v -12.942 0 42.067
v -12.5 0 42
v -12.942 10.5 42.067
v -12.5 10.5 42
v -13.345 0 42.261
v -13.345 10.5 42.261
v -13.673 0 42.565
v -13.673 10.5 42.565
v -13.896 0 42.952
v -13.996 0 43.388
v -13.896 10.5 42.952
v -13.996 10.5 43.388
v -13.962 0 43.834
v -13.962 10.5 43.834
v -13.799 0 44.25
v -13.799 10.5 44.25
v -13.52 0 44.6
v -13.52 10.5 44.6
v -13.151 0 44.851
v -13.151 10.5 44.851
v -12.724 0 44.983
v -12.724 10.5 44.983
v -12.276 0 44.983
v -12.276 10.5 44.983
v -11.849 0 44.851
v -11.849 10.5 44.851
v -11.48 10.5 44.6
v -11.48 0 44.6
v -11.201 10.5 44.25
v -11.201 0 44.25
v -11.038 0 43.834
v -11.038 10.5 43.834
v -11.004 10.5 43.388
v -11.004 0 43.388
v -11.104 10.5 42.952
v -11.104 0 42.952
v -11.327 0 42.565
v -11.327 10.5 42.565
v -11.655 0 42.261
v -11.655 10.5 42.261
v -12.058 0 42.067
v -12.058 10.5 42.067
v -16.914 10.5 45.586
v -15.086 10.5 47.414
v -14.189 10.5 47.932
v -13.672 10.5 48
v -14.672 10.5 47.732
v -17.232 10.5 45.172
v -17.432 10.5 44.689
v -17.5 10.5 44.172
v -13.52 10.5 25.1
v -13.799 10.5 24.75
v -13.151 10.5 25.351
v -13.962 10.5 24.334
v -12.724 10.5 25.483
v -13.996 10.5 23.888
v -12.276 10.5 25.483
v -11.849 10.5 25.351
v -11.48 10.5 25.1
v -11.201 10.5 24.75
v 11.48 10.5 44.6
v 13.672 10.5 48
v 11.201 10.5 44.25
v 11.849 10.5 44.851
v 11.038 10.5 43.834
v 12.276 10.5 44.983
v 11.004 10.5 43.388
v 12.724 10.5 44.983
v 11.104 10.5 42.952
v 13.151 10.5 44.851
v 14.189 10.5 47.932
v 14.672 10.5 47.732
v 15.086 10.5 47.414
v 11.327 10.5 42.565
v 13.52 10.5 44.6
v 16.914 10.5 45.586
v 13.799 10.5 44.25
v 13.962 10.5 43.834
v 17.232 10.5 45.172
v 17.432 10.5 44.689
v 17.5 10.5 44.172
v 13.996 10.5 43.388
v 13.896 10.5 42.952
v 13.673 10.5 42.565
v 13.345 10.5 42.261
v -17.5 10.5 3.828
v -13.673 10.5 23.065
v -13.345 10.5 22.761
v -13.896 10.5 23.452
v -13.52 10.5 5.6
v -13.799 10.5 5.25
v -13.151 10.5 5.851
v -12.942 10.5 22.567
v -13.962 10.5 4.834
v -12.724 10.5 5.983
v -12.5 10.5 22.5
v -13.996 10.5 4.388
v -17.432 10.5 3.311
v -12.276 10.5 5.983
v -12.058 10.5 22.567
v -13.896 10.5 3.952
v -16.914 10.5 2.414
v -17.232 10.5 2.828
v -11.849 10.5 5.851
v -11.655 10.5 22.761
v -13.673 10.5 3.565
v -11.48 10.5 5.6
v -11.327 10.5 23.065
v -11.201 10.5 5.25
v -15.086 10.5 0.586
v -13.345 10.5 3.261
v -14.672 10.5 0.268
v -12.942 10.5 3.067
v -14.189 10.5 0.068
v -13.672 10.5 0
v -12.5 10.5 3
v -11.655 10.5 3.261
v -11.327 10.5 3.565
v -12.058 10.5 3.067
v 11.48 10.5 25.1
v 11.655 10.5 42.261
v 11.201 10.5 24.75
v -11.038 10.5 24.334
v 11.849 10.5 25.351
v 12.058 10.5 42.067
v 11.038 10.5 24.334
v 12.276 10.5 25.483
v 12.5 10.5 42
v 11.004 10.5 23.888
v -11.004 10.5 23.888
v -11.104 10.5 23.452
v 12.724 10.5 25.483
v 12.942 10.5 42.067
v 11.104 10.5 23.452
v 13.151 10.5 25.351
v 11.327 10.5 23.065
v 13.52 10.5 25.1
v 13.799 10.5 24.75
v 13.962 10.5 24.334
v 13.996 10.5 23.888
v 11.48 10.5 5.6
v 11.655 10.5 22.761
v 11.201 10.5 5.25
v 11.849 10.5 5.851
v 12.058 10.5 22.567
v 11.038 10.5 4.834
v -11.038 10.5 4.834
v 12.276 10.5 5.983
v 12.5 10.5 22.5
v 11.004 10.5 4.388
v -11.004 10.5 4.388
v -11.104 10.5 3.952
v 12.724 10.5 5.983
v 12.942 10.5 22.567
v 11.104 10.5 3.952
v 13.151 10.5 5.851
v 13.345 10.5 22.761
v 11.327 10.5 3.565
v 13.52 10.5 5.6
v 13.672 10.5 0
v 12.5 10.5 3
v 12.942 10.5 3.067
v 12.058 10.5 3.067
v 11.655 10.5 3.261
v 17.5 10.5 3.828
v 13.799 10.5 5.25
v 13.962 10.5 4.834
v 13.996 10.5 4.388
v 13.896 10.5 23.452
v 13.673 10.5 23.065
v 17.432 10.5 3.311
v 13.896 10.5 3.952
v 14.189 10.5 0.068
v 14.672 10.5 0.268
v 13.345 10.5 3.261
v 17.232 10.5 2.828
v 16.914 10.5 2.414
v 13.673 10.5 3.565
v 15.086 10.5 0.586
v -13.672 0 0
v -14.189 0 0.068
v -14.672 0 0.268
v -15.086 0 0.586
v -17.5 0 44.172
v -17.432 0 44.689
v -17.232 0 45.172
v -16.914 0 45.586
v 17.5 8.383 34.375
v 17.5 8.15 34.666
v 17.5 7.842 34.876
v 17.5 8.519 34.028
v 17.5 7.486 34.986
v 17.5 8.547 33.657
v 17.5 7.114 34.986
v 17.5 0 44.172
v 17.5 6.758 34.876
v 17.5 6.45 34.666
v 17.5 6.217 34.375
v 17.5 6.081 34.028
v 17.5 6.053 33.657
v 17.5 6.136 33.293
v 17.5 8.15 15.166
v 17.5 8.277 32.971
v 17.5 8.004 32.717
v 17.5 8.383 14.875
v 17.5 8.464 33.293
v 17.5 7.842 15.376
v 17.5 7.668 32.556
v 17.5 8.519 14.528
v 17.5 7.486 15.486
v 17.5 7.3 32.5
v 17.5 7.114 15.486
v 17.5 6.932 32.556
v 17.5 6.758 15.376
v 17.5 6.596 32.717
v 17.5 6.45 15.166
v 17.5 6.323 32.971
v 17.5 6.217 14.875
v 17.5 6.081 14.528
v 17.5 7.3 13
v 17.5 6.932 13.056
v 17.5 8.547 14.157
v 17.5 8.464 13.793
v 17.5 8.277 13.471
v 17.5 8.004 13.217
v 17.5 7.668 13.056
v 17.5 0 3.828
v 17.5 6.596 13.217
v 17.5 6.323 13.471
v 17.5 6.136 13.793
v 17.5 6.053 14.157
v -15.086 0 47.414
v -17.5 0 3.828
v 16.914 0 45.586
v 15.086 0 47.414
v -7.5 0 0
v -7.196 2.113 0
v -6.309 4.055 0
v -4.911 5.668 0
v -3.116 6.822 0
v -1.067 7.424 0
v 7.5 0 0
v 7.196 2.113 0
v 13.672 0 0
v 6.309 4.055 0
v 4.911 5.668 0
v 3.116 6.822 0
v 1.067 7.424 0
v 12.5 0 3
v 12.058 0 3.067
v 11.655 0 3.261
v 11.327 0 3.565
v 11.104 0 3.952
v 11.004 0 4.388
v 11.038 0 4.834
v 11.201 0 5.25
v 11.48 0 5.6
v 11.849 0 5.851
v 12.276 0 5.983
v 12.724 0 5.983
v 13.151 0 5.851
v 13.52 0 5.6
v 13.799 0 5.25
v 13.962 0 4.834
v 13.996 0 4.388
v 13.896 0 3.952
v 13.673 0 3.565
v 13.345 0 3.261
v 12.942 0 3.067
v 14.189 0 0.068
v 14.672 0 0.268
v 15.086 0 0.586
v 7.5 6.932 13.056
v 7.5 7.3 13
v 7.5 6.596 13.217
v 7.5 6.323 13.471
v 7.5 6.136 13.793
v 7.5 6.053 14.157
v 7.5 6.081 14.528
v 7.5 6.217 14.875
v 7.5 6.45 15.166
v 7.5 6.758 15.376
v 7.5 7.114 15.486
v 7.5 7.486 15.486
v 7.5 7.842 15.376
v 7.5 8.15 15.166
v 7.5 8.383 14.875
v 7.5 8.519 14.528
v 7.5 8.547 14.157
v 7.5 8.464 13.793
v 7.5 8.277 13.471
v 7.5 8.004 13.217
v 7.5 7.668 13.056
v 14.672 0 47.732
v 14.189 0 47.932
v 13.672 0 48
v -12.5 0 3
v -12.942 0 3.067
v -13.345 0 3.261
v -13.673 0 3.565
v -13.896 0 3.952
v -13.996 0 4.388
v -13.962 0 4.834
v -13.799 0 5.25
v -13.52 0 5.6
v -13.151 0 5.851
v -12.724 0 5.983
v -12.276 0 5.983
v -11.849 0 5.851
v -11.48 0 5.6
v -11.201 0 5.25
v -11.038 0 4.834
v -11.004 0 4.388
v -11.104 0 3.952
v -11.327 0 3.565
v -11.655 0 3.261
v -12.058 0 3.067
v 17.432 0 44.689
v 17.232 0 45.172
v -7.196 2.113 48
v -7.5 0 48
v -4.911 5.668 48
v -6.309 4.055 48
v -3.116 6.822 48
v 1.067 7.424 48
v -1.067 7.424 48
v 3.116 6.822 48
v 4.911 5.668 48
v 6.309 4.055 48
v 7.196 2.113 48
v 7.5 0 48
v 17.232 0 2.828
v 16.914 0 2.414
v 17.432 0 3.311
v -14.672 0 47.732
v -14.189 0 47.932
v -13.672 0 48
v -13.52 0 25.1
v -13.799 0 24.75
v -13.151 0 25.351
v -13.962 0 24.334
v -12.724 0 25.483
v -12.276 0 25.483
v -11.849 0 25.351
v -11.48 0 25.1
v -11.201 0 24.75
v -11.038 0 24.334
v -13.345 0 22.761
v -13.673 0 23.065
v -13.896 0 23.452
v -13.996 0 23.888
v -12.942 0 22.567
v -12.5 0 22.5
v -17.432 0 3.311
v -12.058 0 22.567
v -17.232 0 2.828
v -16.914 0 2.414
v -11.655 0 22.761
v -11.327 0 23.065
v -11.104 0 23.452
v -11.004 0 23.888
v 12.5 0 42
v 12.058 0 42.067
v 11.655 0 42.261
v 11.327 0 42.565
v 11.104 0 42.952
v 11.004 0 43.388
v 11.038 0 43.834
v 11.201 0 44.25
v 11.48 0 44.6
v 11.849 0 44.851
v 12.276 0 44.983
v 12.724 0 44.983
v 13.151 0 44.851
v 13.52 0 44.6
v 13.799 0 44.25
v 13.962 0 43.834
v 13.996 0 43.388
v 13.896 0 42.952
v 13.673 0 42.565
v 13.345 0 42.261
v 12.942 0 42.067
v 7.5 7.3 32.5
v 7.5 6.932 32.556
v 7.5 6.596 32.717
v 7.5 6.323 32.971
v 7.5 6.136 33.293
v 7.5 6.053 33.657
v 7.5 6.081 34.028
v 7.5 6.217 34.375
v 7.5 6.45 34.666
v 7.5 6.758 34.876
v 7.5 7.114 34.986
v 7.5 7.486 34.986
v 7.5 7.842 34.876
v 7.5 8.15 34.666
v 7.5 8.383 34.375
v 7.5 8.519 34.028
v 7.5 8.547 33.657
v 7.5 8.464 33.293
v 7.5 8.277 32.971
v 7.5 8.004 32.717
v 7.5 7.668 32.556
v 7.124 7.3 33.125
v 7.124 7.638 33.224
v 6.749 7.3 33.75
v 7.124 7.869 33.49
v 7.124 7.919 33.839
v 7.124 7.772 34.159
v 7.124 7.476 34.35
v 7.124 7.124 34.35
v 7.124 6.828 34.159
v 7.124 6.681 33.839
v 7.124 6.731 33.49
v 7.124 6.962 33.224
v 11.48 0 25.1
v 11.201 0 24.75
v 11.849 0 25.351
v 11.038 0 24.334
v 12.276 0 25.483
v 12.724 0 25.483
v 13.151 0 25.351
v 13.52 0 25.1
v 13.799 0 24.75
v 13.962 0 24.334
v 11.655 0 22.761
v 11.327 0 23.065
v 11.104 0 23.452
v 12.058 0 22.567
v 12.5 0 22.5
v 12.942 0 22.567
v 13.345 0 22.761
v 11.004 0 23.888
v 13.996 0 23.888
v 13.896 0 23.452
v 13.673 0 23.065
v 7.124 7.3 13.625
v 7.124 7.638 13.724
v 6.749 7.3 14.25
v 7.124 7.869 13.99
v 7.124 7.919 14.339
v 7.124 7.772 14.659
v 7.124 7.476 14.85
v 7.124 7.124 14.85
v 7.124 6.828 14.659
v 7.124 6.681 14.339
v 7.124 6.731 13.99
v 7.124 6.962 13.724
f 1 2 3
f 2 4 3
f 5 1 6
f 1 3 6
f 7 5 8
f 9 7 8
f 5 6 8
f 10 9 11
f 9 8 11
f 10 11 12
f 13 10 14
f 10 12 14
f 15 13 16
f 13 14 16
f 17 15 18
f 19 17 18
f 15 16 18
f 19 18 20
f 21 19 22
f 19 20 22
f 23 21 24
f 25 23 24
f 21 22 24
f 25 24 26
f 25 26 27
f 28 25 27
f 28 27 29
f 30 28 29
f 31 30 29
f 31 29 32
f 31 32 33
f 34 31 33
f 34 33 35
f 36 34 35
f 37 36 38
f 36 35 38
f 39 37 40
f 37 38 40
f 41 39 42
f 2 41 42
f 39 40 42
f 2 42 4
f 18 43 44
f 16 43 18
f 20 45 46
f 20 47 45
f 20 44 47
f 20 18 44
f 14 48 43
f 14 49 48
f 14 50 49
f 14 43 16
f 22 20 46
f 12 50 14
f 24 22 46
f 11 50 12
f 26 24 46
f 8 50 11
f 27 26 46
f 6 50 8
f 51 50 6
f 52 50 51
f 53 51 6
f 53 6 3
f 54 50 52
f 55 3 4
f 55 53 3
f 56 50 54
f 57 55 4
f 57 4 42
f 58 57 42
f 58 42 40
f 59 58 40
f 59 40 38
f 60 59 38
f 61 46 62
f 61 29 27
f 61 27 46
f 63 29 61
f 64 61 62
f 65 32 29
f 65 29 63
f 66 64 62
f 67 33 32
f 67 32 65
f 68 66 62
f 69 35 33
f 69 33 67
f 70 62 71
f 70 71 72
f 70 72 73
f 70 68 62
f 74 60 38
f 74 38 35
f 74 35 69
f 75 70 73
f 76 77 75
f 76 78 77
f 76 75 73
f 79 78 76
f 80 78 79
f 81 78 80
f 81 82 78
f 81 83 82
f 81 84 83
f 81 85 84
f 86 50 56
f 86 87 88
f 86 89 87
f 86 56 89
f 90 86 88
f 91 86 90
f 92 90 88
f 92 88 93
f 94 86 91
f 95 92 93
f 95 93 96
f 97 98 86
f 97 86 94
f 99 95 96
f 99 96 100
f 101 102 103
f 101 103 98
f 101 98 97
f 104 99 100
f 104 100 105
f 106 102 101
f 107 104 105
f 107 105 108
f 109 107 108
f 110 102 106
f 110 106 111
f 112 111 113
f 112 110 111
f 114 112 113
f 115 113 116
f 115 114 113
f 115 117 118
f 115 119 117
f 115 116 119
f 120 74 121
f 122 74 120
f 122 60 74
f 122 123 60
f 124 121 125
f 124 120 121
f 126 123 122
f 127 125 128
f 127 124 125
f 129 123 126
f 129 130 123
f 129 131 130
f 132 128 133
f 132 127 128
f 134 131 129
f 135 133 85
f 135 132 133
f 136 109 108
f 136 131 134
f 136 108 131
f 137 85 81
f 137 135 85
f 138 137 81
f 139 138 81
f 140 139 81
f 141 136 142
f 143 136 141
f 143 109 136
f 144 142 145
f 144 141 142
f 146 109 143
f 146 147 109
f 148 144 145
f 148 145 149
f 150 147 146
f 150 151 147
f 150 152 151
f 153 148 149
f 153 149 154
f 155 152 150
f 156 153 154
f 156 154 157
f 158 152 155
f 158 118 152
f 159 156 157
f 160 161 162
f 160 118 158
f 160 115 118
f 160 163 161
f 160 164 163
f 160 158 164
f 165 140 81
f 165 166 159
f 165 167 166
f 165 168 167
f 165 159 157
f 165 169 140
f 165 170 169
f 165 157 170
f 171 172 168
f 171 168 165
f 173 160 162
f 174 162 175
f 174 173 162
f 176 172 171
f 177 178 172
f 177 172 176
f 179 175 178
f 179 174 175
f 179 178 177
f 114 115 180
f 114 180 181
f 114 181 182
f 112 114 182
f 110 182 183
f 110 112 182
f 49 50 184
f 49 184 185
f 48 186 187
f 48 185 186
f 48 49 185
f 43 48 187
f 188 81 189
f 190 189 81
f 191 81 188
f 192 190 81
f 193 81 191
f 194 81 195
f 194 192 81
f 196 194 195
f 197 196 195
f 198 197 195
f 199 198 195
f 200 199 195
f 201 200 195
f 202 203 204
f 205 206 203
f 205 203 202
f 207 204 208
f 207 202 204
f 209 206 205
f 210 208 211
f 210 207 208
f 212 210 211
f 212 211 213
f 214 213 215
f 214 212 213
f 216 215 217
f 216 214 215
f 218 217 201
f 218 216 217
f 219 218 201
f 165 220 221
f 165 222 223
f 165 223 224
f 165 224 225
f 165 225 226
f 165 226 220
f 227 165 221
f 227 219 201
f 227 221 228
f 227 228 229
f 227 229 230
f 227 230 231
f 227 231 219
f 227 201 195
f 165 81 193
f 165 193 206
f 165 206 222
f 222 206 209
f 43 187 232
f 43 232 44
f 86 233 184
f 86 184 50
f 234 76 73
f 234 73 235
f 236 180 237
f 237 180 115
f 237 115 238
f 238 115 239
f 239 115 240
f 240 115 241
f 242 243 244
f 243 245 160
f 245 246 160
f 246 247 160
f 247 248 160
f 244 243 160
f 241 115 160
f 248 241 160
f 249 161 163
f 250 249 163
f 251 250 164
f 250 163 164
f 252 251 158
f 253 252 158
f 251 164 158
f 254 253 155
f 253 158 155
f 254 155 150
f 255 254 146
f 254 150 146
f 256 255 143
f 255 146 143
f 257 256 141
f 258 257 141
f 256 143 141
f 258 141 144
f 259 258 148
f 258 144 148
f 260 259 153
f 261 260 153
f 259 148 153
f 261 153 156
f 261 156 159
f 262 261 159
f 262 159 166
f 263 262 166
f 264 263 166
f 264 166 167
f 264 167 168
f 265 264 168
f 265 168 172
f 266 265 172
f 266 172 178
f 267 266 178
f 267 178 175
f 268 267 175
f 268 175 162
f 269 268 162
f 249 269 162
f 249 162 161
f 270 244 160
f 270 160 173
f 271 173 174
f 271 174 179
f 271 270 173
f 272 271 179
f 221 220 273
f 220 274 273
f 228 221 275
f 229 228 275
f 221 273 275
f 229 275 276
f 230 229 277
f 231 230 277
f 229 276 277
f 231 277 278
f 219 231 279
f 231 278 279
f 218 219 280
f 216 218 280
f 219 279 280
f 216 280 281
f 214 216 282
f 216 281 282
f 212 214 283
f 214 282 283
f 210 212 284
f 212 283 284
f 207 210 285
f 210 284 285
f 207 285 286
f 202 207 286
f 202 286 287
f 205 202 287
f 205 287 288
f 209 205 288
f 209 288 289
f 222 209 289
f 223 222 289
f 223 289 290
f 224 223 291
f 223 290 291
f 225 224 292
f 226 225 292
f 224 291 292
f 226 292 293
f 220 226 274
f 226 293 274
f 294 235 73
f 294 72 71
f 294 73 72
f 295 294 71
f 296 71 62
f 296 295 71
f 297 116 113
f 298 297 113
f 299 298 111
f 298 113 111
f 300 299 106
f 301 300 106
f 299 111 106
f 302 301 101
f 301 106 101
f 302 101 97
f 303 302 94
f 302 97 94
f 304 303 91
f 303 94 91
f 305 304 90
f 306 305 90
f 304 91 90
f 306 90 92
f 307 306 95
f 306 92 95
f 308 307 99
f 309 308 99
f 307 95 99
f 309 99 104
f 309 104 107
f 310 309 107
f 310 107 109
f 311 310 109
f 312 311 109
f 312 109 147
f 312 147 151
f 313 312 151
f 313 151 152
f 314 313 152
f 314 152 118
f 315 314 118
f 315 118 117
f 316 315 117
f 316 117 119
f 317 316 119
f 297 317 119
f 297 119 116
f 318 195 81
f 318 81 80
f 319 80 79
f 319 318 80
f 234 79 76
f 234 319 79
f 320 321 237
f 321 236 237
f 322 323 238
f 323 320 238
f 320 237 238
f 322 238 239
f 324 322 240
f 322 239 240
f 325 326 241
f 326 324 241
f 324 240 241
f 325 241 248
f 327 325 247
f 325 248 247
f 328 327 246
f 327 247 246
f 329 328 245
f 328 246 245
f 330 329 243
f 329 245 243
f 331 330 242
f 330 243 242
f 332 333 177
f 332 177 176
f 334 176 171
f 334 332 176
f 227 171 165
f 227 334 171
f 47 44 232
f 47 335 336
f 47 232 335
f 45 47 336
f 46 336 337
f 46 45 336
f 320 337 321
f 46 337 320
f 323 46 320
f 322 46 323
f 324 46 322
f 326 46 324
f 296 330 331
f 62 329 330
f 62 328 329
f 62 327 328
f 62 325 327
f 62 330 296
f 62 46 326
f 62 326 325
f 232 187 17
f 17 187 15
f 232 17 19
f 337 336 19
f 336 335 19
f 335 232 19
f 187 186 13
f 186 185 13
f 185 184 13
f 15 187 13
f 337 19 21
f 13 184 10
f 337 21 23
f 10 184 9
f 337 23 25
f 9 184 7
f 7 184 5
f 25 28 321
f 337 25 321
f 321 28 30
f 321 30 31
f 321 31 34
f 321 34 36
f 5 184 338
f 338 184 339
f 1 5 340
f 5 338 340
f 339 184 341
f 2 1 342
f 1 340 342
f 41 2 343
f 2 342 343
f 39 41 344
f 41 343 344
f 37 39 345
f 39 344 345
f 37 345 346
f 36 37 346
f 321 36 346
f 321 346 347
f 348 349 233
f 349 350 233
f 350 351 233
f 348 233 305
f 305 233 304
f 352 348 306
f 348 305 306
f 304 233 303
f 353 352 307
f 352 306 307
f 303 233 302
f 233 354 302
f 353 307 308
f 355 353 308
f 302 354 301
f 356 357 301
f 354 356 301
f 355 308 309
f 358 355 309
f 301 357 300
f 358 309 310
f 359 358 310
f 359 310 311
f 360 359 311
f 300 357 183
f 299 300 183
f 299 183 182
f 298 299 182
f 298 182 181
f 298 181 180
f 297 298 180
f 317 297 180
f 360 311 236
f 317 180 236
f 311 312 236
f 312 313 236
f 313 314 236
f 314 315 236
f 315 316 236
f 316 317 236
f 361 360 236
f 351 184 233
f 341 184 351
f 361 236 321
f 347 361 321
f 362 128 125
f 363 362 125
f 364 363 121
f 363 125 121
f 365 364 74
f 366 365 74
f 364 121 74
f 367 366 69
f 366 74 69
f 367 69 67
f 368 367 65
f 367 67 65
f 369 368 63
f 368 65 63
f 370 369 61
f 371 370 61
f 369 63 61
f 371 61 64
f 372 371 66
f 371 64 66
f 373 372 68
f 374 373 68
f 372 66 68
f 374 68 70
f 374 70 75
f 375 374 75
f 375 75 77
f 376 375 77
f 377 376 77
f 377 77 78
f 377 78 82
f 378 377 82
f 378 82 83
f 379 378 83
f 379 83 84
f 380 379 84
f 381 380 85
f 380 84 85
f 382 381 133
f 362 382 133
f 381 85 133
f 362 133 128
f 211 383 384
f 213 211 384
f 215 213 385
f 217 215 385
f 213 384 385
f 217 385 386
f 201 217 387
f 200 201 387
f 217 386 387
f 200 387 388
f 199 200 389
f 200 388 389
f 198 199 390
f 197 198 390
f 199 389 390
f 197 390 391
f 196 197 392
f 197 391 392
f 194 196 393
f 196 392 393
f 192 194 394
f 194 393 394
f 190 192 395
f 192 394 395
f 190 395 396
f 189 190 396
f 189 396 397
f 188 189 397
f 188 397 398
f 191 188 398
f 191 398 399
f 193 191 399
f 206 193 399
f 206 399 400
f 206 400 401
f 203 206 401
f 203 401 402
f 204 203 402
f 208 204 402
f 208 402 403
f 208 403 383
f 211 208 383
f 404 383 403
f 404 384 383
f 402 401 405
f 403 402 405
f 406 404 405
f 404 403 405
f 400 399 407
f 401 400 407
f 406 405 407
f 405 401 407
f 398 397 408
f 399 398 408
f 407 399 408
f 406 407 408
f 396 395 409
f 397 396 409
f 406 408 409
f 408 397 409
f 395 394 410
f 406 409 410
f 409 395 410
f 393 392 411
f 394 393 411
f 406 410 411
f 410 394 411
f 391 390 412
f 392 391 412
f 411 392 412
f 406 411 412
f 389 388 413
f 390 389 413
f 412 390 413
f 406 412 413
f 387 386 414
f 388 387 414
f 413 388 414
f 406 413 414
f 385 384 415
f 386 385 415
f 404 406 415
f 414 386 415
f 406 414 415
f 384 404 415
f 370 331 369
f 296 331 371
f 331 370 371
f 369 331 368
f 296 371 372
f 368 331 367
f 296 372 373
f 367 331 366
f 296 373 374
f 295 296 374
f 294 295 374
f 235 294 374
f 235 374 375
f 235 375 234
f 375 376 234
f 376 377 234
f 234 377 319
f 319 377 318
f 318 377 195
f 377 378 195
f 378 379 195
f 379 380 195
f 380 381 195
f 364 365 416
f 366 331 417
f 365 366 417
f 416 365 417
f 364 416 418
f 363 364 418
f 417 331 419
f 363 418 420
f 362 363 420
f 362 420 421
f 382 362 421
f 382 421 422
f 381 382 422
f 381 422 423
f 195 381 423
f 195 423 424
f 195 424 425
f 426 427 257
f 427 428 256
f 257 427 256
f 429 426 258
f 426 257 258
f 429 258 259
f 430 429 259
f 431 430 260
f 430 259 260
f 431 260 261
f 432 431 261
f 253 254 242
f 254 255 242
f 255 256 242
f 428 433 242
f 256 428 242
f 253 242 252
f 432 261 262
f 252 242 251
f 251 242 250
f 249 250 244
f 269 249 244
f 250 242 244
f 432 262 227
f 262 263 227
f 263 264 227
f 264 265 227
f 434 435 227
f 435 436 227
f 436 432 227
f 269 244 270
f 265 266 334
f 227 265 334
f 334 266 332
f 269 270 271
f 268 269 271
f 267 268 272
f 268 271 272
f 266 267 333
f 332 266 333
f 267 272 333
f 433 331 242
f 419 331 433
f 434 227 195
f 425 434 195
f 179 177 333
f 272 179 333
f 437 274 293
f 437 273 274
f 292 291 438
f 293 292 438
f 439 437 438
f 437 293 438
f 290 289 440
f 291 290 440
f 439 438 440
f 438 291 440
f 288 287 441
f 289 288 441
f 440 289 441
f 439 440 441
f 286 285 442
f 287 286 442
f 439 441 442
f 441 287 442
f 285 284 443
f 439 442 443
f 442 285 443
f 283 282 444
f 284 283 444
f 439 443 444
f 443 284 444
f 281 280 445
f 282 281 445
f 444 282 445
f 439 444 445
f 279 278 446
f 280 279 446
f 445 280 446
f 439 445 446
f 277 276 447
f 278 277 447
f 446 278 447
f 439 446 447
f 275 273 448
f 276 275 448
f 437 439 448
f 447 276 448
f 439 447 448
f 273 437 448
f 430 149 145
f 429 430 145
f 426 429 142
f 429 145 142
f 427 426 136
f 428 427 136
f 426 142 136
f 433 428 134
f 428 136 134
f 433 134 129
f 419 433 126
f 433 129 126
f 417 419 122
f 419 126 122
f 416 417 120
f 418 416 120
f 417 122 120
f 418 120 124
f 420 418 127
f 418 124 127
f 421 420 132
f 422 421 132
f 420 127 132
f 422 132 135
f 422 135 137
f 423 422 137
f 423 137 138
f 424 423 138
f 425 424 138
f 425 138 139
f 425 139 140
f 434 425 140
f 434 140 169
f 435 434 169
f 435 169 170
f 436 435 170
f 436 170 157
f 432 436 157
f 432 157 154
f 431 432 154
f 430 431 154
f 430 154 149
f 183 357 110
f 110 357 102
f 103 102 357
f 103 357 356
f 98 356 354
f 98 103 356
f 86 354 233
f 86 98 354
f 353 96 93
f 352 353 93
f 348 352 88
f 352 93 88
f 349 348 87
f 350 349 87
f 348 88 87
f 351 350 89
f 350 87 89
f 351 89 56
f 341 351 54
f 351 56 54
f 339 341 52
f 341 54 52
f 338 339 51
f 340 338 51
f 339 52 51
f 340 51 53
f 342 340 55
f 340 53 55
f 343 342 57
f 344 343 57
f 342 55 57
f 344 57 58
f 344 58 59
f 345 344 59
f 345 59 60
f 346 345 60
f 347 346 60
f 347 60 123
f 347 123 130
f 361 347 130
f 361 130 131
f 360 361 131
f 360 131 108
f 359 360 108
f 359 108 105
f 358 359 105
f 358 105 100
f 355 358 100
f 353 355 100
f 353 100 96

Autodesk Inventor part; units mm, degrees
ref_plane "YZ Plane" through (0, 0, 0) normal (1, 0, 0) x (0, 1, 0)
ref_plane "XZ Plane" through (0, 0, 0) normal (0, 1, 0) x (-1, 0, 0)
ref_plane "XY Plane" through (0, 0, 0) normal (0, 0, 1) x (1, 0, 0)
sketch "Sketch1" plane through (0, 0, 0) normal (0, 0, 1) x (1, 0, 0)
  circle A0 centre (0, 0) radius 7.5
  line L0 (-17.5, 0) -> (-7.5, 0)
  line L1 (7.5, 0) -> (17.5, 0)
  line L2 (-17.5, 0) -> (-17.5, 10.5)
  line L3 (-17.5, 10.5) -> (17.5, 10.5)
  line L4 (17.5, 10.5) -> (17.5, 0)
  dimension "d5" = 15
  dimension "d6" = 0
  dimension "d8" = 0
  dimension "d11" = 10
  dimension "d13" = 10
  dimension "d19" = 10.5
  dimension "d64" = 35
extrude "Extrusion1" add sketch "Sketch1" along normal blind 48 contours A0 L0 L2 L3 L4 L1
sketch "Sketch3" plane through (7.5, 0, 0) normal (0, -1, 0) x (1, 0, 0)
  line L0 (10, 0) -> (10, 48) projected
  line L1 (0, 48) -> (10, 48) projected
  line L2 (0, 0) -> (0, 48) projected
  line L3 (0, 0) -> (10, 0) projected
  line L4 (-25, 0) -> (-15, 0) projected
  line L5 (-15, 0) -> (-15, 48) projected
  line L6 (-25, 48) -> (-15, 48) projected
  line L7 (-25, 0) -> (-25, 48) projected
  point P0 (-7.5, 0)
  point P1 (5, 4.5)
  point P2 (5, 24)
  point P3 (5, 43.5)
  point P4 (-20, 43.5)
  point P5 (-20, 4.5)
  point P6 (-20, 24)
  dimension "d31" = 48
  dimension "d35" = 5
  dimension "d44" = 4.5
  dimension "d45" = 4.5
  dimension "d46" = 24
  dimension "d47" = 5
  dimension "d48" = 10
  dimension "d49" = 10
hole "Hole1" at (12.5, 0, 4.5) at (12.5, 0, 24) at (12.5, 0, 43.5) at (-12.5, 0, 43.5) at (-12.5, 0, 4.5) at (-12.5, 0, 24) direction (0, 1, 0) diameter 3 end through all
chamfer "Chamfer1" distance 3 angle 45 4 edges at (17.5, 5.25, 48) (-17.5, 5.25, 48) (-17.5, 5.25, 0) (17.5, 5.25, 0)
fillet "Fillet2" radius 2 8 edges at (14.5, 5.25, 48) (17.5, 5.25, 45) (17.5, 5.25, 3) (14.5, 5.25, 0) (-14.5, 5.25, 0) (-17.5, 5.25, 3) (-17.5, 5.25, 45) (-14.5, 5.25, 48)
sketch "Sketch4" plane through (17.5, 0, 3.8284) normal (1, 0, 0) x (0, 0, -1)
  line L0 (0, 10.5) -> (-40.3431, 10.5) projected
  line L1 (3.8284, 0) -> (3.8284, 10.5) projected
  line L2 (-44.1716, 10.5) -> (-44.1716, 0) projected
  point P0 (-10.4216, 7.3)
  point P1 (-29.9216, 7.3)
  dimension "d54" = 3.2
  dimension "d55" = 14.25
  dimension "d56" = 14.25
hole "Hole2" at (17.5, 7.3, 14.25) at (17.5, 7.3, 33.75) direction (-1, 0, 0) diameter 2.5 depth 10 tip angle 118
equation "\"d13\" = d11"
equation "\"d35\" = 0.5 * d48"
equation "\"d45\" = d44"
equation "\"d46\" = 0.5 * d31"
equation "\"d47\" = d35"
equation "\"d56\" = d55"
properties part number "3DP_PLA_X_end_bottom_half" material "ABS Plastic"
